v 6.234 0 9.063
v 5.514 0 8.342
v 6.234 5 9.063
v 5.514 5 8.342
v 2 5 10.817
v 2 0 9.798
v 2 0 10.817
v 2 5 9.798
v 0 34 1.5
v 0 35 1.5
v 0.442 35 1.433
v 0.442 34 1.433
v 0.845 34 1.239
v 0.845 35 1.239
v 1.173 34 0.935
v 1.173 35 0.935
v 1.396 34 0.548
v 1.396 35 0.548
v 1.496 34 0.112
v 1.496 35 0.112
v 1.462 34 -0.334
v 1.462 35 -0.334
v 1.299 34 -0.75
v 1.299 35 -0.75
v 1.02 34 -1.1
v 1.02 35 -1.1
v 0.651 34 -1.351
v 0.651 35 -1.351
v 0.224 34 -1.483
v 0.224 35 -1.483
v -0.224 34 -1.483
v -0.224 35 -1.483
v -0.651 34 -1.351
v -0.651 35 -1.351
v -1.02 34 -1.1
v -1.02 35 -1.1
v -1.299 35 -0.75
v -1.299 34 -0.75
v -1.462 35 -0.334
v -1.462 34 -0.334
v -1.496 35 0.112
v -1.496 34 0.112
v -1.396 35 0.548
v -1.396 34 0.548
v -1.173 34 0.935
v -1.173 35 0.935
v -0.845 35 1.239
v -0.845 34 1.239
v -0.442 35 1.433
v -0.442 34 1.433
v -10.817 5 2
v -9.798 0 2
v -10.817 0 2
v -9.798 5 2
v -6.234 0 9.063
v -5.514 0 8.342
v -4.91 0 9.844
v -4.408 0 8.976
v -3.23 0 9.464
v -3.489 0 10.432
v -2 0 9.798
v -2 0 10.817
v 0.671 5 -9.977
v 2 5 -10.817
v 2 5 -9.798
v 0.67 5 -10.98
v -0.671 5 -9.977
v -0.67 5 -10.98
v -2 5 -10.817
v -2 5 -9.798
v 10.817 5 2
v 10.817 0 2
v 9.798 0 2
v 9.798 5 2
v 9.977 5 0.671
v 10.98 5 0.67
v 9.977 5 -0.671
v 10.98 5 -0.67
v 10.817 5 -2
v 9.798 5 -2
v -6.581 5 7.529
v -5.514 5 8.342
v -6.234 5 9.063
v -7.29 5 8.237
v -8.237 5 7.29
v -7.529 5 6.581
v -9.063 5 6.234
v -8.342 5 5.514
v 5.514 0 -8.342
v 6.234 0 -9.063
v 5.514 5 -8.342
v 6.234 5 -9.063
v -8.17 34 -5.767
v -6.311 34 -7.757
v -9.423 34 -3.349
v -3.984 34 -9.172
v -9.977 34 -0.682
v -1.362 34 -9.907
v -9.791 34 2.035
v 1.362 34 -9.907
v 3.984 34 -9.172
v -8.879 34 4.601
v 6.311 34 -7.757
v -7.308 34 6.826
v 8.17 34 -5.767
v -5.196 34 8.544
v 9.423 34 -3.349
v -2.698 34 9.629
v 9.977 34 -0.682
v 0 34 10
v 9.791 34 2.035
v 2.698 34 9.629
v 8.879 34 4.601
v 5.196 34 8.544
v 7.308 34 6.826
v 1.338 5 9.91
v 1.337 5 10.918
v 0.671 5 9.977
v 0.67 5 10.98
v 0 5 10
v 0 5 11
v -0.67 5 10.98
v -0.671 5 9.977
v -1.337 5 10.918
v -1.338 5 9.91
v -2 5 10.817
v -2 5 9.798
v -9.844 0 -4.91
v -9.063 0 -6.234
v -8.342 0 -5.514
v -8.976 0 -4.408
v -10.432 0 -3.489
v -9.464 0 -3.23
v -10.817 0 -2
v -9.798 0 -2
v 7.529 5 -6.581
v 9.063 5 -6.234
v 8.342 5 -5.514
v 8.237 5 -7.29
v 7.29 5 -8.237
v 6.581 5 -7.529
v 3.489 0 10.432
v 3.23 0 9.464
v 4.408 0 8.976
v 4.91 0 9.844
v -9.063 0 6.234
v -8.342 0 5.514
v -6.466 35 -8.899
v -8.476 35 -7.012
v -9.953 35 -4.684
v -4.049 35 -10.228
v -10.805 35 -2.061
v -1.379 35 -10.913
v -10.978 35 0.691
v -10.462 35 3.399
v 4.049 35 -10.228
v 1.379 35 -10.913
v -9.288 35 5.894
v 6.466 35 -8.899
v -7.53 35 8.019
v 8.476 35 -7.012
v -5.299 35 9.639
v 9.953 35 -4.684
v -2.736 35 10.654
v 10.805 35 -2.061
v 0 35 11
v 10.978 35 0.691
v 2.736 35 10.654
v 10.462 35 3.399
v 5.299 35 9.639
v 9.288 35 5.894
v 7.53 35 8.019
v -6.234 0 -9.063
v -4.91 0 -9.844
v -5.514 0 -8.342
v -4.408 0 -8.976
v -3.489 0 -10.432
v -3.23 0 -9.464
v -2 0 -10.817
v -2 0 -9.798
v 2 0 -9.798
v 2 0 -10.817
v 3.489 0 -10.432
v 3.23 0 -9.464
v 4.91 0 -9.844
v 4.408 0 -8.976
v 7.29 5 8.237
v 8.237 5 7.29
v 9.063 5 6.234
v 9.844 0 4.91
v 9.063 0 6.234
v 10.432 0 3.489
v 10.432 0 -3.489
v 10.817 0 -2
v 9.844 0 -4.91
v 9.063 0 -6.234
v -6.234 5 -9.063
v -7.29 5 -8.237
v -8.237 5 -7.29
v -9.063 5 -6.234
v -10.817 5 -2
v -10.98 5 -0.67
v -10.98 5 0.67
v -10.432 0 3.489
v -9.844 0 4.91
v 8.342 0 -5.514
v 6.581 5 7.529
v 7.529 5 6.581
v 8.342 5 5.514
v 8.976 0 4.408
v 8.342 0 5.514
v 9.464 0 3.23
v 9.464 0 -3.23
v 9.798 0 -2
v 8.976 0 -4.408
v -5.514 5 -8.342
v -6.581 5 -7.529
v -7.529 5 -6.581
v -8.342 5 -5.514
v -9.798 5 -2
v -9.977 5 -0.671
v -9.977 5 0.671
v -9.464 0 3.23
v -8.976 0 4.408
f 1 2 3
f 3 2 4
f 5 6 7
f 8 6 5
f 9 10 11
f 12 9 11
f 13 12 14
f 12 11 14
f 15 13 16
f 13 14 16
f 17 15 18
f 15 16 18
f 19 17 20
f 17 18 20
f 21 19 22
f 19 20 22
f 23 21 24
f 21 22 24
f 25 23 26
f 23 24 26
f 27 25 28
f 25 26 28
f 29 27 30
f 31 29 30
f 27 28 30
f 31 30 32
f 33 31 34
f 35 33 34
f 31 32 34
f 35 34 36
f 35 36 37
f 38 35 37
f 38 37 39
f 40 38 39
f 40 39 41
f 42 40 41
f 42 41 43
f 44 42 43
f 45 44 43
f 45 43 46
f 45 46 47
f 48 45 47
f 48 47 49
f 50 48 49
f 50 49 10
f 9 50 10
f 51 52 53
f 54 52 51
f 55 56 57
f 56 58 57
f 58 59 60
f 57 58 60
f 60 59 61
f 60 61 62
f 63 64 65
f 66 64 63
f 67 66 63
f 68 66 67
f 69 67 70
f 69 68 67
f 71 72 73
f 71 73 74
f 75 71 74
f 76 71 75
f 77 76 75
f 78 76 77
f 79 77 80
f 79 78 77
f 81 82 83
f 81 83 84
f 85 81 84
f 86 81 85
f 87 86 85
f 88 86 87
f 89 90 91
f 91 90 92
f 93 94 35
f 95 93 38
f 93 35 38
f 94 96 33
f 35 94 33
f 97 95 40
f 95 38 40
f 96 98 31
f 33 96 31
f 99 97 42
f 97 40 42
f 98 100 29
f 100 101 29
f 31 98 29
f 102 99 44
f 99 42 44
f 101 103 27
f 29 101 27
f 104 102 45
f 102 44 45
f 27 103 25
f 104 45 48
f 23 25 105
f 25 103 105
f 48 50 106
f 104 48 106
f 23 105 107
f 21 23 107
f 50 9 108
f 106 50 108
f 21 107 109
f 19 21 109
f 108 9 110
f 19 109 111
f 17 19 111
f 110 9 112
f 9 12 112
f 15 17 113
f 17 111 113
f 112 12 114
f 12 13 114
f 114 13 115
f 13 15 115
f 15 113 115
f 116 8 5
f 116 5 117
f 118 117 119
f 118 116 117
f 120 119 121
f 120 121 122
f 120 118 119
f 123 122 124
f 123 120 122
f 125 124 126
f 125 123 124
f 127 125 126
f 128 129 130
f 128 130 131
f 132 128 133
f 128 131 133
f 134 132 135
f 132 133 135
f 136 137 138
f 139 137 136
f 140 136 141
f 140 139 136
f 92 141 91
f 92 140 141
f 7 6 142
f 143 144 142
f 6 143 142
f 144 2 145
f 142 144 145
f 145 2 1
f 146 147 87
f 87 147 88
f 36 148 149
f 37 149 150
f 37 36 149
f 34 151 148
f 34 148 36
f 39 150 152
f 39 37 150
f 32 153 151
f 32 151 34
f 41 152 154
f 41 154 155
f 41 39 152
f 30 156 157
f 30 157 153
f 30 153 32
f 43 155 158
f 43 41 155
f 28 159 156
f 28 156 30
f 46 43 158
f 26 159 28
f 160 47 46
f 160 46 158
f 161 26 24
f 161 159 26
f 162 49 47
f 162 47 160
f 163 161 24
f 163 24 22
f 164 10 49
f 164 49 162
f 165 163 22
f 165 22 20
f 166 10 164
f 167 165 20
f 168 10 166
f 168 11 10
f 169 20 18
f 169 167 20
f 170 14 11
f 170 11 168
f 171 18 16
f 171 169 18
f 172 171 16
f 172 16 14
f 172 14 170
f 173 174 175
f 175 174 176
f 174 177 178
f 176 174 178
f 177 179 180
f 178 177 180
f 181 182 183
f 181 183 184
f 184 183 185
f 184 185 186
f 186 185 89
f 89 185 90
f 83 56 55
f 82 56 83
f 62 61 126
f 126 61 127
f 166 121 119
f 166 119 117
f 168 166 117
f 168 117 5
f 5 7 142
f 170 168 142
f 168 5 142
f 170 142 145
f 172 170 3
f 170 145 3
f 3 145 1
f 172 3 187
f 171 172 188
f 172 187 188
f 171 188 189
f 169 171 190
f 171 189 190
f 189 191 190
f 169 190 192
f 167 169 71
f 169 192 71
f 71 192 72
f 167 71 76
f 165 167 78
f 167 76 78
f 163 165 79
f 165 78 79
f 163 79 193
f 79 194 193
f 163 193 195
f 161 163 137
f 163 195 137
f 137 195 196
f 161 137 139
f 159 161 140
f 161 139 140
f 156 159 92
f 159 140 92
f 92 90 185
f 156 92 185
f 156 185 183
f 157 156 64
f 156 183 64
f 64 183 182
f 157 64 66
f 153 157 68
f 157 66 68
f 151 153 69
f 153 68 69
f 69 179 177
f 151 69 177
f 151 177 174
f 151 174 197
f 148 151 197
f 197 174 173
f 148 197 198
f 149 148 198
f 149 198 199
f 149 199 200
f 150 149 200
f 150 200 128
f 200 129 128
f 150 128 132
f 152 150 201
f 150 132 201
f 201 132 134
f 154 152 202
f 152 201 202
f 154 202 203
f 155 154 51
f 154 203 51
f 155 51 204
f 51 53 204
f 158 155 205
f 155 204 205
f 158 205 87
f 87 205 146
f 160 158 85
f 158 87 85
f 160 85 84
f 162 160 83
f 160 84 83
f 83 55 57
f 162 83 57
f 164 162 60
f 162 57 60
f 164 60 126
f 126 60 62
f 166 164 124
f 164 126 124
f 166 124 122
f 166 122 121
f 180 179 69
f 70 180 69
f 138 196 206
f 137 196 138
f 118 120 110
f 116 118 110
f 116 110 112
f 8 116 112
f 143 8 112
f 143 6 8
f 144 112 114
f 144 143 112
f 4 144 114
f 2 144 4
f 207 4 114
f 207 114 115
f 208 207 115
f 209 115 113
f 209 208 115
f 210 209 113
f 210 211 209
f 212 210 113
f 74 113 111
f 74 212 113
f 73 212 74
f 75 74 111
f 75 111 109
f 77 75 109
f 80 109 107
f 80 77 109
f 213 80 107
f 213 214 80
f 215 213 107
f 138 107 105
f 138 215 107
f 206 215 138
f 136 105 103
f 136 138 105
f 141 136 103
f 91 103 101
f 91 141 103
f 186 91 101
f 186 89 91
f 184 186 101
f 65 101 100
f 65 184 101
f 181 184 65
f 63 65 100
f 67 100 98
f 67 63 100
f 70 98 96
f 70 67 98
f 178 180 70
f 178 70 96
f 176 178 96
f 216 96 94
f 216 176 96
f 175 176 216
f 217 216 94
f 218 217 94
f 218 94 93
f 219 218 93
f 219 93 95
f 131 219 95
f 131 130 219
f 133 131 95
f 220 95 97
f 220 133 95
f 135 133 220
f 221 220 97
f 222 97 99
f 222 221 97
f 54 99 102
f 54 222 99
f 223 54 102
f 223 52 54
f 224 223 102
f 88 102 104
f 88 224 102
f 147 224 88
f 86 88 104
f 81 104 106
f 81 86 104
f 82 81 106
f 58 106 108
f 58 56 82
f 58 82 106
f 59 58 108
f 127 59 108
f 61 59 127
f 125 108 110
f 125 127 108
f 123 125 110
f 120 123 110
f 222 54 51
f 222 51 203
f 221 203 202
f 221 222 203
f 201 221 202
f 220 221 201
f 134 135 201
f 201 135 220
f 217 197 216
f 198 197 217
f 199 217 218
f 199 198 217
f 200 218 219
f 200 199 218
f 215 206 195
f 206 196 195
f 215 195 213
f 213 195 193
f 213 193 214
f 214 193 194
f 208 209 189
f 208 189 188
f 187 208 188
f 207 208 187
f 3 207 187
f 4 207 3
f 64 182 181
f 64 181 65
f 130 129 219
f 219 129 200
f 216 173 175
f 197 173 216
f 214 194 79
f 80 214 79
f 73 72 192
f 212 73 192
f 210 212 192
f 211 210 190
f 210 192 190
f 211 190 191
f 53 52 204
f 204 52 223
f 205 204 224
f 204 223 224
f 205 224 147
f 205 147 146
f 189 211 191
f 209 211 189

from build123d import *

# Parameters (mm, degrees)
SKETCH1_R           = 11
BOSS_EXTRUDE1_DEPTH = 35
SHELL1_T            = -1
SKETCH4_W           = 4
SKETCH4_H           = 5
CUT_EXTRUDE1_DEPTH  = 56.018178814
CIRPATTERN1_COUNT   = 8
CUT_EXTRUDE2_REACH  = 40.301
SKETCH5_R           = 1.5


with BuildPart() as part:
    # Sketch1 → Boss-Extrude1 (new body)
    with BuildSketch(Plane(origin=(0, 0, 0), x_dir=(1, 0, 0), z_dir=(0, 1, 0))):
        with Locations(Location((0, 0, 0), (0, 0, 270))):
            Circle(SKETCH1_R)
    extrude(amount=BOSS_EXTRUDE1_DEPTH)

    # Shell1
    shell1_openings = [part.faces().sort_by_distance(p)[0] for p in [
        (0, 0, 0),
    ]]
    offset(amount=SHELL1_T, openings=shell1_openings, kind=Kind.INTERSECTION)

    # Sketch4 → Cut-Extrude1 (cut, symmetric)
    with BuildSketch(Plane(origin=(30, 0, 0), x_dir=(0, 0, -1), z_dir=(1, 0, 0))):
        with Locations((0, 2.5)):
            Rectangle(SKETCH4_W, SKETCH4_H)
    cut_extrude1 = extrude(amount=CUT_EXTRUDE1_DEPTH, both=True, mode=Mode.SUBTRACT)

    # CirPattern1: Cut-Extrude1 ×8 about axis
    cirpattern1_axis = Axis((0, 0, 0), (0, 1, 0))
    for i in range(1, CIRPATTERN1_COUNT):
        add(cut_extrude1.rotate(cirpattern1_axis, i * 360 / CIRPATTERN1_COUNT), mode=Mode.SUBTRACT)

    # Sketch5 → Cut-Extrude2 (cut, up to next)
    with BuildSketch(Plane(origin=(0, 35, 0), x_dir=(1, 0, 0), z_dir=(0, 1, 0)), mode=Mode.PRIVATE) as cut_extrude2_sk1:
        with Locations(Location((0, 0, 0), (0, 0, 270))):
            Circle(SKETCH5_R)
    cut_extrude2_tool1 = extrude(cut_extrude2_sk1.sketch, amount=-CUT_EXTRUDE2_REACH, mode=Mode.PRIVATE) & part.part
    add(cut_extrude2_tool1.solids().sort_by_distance((0, 35, 0))[0], mode=Mode.SUBTRACT)


solid = part.part
